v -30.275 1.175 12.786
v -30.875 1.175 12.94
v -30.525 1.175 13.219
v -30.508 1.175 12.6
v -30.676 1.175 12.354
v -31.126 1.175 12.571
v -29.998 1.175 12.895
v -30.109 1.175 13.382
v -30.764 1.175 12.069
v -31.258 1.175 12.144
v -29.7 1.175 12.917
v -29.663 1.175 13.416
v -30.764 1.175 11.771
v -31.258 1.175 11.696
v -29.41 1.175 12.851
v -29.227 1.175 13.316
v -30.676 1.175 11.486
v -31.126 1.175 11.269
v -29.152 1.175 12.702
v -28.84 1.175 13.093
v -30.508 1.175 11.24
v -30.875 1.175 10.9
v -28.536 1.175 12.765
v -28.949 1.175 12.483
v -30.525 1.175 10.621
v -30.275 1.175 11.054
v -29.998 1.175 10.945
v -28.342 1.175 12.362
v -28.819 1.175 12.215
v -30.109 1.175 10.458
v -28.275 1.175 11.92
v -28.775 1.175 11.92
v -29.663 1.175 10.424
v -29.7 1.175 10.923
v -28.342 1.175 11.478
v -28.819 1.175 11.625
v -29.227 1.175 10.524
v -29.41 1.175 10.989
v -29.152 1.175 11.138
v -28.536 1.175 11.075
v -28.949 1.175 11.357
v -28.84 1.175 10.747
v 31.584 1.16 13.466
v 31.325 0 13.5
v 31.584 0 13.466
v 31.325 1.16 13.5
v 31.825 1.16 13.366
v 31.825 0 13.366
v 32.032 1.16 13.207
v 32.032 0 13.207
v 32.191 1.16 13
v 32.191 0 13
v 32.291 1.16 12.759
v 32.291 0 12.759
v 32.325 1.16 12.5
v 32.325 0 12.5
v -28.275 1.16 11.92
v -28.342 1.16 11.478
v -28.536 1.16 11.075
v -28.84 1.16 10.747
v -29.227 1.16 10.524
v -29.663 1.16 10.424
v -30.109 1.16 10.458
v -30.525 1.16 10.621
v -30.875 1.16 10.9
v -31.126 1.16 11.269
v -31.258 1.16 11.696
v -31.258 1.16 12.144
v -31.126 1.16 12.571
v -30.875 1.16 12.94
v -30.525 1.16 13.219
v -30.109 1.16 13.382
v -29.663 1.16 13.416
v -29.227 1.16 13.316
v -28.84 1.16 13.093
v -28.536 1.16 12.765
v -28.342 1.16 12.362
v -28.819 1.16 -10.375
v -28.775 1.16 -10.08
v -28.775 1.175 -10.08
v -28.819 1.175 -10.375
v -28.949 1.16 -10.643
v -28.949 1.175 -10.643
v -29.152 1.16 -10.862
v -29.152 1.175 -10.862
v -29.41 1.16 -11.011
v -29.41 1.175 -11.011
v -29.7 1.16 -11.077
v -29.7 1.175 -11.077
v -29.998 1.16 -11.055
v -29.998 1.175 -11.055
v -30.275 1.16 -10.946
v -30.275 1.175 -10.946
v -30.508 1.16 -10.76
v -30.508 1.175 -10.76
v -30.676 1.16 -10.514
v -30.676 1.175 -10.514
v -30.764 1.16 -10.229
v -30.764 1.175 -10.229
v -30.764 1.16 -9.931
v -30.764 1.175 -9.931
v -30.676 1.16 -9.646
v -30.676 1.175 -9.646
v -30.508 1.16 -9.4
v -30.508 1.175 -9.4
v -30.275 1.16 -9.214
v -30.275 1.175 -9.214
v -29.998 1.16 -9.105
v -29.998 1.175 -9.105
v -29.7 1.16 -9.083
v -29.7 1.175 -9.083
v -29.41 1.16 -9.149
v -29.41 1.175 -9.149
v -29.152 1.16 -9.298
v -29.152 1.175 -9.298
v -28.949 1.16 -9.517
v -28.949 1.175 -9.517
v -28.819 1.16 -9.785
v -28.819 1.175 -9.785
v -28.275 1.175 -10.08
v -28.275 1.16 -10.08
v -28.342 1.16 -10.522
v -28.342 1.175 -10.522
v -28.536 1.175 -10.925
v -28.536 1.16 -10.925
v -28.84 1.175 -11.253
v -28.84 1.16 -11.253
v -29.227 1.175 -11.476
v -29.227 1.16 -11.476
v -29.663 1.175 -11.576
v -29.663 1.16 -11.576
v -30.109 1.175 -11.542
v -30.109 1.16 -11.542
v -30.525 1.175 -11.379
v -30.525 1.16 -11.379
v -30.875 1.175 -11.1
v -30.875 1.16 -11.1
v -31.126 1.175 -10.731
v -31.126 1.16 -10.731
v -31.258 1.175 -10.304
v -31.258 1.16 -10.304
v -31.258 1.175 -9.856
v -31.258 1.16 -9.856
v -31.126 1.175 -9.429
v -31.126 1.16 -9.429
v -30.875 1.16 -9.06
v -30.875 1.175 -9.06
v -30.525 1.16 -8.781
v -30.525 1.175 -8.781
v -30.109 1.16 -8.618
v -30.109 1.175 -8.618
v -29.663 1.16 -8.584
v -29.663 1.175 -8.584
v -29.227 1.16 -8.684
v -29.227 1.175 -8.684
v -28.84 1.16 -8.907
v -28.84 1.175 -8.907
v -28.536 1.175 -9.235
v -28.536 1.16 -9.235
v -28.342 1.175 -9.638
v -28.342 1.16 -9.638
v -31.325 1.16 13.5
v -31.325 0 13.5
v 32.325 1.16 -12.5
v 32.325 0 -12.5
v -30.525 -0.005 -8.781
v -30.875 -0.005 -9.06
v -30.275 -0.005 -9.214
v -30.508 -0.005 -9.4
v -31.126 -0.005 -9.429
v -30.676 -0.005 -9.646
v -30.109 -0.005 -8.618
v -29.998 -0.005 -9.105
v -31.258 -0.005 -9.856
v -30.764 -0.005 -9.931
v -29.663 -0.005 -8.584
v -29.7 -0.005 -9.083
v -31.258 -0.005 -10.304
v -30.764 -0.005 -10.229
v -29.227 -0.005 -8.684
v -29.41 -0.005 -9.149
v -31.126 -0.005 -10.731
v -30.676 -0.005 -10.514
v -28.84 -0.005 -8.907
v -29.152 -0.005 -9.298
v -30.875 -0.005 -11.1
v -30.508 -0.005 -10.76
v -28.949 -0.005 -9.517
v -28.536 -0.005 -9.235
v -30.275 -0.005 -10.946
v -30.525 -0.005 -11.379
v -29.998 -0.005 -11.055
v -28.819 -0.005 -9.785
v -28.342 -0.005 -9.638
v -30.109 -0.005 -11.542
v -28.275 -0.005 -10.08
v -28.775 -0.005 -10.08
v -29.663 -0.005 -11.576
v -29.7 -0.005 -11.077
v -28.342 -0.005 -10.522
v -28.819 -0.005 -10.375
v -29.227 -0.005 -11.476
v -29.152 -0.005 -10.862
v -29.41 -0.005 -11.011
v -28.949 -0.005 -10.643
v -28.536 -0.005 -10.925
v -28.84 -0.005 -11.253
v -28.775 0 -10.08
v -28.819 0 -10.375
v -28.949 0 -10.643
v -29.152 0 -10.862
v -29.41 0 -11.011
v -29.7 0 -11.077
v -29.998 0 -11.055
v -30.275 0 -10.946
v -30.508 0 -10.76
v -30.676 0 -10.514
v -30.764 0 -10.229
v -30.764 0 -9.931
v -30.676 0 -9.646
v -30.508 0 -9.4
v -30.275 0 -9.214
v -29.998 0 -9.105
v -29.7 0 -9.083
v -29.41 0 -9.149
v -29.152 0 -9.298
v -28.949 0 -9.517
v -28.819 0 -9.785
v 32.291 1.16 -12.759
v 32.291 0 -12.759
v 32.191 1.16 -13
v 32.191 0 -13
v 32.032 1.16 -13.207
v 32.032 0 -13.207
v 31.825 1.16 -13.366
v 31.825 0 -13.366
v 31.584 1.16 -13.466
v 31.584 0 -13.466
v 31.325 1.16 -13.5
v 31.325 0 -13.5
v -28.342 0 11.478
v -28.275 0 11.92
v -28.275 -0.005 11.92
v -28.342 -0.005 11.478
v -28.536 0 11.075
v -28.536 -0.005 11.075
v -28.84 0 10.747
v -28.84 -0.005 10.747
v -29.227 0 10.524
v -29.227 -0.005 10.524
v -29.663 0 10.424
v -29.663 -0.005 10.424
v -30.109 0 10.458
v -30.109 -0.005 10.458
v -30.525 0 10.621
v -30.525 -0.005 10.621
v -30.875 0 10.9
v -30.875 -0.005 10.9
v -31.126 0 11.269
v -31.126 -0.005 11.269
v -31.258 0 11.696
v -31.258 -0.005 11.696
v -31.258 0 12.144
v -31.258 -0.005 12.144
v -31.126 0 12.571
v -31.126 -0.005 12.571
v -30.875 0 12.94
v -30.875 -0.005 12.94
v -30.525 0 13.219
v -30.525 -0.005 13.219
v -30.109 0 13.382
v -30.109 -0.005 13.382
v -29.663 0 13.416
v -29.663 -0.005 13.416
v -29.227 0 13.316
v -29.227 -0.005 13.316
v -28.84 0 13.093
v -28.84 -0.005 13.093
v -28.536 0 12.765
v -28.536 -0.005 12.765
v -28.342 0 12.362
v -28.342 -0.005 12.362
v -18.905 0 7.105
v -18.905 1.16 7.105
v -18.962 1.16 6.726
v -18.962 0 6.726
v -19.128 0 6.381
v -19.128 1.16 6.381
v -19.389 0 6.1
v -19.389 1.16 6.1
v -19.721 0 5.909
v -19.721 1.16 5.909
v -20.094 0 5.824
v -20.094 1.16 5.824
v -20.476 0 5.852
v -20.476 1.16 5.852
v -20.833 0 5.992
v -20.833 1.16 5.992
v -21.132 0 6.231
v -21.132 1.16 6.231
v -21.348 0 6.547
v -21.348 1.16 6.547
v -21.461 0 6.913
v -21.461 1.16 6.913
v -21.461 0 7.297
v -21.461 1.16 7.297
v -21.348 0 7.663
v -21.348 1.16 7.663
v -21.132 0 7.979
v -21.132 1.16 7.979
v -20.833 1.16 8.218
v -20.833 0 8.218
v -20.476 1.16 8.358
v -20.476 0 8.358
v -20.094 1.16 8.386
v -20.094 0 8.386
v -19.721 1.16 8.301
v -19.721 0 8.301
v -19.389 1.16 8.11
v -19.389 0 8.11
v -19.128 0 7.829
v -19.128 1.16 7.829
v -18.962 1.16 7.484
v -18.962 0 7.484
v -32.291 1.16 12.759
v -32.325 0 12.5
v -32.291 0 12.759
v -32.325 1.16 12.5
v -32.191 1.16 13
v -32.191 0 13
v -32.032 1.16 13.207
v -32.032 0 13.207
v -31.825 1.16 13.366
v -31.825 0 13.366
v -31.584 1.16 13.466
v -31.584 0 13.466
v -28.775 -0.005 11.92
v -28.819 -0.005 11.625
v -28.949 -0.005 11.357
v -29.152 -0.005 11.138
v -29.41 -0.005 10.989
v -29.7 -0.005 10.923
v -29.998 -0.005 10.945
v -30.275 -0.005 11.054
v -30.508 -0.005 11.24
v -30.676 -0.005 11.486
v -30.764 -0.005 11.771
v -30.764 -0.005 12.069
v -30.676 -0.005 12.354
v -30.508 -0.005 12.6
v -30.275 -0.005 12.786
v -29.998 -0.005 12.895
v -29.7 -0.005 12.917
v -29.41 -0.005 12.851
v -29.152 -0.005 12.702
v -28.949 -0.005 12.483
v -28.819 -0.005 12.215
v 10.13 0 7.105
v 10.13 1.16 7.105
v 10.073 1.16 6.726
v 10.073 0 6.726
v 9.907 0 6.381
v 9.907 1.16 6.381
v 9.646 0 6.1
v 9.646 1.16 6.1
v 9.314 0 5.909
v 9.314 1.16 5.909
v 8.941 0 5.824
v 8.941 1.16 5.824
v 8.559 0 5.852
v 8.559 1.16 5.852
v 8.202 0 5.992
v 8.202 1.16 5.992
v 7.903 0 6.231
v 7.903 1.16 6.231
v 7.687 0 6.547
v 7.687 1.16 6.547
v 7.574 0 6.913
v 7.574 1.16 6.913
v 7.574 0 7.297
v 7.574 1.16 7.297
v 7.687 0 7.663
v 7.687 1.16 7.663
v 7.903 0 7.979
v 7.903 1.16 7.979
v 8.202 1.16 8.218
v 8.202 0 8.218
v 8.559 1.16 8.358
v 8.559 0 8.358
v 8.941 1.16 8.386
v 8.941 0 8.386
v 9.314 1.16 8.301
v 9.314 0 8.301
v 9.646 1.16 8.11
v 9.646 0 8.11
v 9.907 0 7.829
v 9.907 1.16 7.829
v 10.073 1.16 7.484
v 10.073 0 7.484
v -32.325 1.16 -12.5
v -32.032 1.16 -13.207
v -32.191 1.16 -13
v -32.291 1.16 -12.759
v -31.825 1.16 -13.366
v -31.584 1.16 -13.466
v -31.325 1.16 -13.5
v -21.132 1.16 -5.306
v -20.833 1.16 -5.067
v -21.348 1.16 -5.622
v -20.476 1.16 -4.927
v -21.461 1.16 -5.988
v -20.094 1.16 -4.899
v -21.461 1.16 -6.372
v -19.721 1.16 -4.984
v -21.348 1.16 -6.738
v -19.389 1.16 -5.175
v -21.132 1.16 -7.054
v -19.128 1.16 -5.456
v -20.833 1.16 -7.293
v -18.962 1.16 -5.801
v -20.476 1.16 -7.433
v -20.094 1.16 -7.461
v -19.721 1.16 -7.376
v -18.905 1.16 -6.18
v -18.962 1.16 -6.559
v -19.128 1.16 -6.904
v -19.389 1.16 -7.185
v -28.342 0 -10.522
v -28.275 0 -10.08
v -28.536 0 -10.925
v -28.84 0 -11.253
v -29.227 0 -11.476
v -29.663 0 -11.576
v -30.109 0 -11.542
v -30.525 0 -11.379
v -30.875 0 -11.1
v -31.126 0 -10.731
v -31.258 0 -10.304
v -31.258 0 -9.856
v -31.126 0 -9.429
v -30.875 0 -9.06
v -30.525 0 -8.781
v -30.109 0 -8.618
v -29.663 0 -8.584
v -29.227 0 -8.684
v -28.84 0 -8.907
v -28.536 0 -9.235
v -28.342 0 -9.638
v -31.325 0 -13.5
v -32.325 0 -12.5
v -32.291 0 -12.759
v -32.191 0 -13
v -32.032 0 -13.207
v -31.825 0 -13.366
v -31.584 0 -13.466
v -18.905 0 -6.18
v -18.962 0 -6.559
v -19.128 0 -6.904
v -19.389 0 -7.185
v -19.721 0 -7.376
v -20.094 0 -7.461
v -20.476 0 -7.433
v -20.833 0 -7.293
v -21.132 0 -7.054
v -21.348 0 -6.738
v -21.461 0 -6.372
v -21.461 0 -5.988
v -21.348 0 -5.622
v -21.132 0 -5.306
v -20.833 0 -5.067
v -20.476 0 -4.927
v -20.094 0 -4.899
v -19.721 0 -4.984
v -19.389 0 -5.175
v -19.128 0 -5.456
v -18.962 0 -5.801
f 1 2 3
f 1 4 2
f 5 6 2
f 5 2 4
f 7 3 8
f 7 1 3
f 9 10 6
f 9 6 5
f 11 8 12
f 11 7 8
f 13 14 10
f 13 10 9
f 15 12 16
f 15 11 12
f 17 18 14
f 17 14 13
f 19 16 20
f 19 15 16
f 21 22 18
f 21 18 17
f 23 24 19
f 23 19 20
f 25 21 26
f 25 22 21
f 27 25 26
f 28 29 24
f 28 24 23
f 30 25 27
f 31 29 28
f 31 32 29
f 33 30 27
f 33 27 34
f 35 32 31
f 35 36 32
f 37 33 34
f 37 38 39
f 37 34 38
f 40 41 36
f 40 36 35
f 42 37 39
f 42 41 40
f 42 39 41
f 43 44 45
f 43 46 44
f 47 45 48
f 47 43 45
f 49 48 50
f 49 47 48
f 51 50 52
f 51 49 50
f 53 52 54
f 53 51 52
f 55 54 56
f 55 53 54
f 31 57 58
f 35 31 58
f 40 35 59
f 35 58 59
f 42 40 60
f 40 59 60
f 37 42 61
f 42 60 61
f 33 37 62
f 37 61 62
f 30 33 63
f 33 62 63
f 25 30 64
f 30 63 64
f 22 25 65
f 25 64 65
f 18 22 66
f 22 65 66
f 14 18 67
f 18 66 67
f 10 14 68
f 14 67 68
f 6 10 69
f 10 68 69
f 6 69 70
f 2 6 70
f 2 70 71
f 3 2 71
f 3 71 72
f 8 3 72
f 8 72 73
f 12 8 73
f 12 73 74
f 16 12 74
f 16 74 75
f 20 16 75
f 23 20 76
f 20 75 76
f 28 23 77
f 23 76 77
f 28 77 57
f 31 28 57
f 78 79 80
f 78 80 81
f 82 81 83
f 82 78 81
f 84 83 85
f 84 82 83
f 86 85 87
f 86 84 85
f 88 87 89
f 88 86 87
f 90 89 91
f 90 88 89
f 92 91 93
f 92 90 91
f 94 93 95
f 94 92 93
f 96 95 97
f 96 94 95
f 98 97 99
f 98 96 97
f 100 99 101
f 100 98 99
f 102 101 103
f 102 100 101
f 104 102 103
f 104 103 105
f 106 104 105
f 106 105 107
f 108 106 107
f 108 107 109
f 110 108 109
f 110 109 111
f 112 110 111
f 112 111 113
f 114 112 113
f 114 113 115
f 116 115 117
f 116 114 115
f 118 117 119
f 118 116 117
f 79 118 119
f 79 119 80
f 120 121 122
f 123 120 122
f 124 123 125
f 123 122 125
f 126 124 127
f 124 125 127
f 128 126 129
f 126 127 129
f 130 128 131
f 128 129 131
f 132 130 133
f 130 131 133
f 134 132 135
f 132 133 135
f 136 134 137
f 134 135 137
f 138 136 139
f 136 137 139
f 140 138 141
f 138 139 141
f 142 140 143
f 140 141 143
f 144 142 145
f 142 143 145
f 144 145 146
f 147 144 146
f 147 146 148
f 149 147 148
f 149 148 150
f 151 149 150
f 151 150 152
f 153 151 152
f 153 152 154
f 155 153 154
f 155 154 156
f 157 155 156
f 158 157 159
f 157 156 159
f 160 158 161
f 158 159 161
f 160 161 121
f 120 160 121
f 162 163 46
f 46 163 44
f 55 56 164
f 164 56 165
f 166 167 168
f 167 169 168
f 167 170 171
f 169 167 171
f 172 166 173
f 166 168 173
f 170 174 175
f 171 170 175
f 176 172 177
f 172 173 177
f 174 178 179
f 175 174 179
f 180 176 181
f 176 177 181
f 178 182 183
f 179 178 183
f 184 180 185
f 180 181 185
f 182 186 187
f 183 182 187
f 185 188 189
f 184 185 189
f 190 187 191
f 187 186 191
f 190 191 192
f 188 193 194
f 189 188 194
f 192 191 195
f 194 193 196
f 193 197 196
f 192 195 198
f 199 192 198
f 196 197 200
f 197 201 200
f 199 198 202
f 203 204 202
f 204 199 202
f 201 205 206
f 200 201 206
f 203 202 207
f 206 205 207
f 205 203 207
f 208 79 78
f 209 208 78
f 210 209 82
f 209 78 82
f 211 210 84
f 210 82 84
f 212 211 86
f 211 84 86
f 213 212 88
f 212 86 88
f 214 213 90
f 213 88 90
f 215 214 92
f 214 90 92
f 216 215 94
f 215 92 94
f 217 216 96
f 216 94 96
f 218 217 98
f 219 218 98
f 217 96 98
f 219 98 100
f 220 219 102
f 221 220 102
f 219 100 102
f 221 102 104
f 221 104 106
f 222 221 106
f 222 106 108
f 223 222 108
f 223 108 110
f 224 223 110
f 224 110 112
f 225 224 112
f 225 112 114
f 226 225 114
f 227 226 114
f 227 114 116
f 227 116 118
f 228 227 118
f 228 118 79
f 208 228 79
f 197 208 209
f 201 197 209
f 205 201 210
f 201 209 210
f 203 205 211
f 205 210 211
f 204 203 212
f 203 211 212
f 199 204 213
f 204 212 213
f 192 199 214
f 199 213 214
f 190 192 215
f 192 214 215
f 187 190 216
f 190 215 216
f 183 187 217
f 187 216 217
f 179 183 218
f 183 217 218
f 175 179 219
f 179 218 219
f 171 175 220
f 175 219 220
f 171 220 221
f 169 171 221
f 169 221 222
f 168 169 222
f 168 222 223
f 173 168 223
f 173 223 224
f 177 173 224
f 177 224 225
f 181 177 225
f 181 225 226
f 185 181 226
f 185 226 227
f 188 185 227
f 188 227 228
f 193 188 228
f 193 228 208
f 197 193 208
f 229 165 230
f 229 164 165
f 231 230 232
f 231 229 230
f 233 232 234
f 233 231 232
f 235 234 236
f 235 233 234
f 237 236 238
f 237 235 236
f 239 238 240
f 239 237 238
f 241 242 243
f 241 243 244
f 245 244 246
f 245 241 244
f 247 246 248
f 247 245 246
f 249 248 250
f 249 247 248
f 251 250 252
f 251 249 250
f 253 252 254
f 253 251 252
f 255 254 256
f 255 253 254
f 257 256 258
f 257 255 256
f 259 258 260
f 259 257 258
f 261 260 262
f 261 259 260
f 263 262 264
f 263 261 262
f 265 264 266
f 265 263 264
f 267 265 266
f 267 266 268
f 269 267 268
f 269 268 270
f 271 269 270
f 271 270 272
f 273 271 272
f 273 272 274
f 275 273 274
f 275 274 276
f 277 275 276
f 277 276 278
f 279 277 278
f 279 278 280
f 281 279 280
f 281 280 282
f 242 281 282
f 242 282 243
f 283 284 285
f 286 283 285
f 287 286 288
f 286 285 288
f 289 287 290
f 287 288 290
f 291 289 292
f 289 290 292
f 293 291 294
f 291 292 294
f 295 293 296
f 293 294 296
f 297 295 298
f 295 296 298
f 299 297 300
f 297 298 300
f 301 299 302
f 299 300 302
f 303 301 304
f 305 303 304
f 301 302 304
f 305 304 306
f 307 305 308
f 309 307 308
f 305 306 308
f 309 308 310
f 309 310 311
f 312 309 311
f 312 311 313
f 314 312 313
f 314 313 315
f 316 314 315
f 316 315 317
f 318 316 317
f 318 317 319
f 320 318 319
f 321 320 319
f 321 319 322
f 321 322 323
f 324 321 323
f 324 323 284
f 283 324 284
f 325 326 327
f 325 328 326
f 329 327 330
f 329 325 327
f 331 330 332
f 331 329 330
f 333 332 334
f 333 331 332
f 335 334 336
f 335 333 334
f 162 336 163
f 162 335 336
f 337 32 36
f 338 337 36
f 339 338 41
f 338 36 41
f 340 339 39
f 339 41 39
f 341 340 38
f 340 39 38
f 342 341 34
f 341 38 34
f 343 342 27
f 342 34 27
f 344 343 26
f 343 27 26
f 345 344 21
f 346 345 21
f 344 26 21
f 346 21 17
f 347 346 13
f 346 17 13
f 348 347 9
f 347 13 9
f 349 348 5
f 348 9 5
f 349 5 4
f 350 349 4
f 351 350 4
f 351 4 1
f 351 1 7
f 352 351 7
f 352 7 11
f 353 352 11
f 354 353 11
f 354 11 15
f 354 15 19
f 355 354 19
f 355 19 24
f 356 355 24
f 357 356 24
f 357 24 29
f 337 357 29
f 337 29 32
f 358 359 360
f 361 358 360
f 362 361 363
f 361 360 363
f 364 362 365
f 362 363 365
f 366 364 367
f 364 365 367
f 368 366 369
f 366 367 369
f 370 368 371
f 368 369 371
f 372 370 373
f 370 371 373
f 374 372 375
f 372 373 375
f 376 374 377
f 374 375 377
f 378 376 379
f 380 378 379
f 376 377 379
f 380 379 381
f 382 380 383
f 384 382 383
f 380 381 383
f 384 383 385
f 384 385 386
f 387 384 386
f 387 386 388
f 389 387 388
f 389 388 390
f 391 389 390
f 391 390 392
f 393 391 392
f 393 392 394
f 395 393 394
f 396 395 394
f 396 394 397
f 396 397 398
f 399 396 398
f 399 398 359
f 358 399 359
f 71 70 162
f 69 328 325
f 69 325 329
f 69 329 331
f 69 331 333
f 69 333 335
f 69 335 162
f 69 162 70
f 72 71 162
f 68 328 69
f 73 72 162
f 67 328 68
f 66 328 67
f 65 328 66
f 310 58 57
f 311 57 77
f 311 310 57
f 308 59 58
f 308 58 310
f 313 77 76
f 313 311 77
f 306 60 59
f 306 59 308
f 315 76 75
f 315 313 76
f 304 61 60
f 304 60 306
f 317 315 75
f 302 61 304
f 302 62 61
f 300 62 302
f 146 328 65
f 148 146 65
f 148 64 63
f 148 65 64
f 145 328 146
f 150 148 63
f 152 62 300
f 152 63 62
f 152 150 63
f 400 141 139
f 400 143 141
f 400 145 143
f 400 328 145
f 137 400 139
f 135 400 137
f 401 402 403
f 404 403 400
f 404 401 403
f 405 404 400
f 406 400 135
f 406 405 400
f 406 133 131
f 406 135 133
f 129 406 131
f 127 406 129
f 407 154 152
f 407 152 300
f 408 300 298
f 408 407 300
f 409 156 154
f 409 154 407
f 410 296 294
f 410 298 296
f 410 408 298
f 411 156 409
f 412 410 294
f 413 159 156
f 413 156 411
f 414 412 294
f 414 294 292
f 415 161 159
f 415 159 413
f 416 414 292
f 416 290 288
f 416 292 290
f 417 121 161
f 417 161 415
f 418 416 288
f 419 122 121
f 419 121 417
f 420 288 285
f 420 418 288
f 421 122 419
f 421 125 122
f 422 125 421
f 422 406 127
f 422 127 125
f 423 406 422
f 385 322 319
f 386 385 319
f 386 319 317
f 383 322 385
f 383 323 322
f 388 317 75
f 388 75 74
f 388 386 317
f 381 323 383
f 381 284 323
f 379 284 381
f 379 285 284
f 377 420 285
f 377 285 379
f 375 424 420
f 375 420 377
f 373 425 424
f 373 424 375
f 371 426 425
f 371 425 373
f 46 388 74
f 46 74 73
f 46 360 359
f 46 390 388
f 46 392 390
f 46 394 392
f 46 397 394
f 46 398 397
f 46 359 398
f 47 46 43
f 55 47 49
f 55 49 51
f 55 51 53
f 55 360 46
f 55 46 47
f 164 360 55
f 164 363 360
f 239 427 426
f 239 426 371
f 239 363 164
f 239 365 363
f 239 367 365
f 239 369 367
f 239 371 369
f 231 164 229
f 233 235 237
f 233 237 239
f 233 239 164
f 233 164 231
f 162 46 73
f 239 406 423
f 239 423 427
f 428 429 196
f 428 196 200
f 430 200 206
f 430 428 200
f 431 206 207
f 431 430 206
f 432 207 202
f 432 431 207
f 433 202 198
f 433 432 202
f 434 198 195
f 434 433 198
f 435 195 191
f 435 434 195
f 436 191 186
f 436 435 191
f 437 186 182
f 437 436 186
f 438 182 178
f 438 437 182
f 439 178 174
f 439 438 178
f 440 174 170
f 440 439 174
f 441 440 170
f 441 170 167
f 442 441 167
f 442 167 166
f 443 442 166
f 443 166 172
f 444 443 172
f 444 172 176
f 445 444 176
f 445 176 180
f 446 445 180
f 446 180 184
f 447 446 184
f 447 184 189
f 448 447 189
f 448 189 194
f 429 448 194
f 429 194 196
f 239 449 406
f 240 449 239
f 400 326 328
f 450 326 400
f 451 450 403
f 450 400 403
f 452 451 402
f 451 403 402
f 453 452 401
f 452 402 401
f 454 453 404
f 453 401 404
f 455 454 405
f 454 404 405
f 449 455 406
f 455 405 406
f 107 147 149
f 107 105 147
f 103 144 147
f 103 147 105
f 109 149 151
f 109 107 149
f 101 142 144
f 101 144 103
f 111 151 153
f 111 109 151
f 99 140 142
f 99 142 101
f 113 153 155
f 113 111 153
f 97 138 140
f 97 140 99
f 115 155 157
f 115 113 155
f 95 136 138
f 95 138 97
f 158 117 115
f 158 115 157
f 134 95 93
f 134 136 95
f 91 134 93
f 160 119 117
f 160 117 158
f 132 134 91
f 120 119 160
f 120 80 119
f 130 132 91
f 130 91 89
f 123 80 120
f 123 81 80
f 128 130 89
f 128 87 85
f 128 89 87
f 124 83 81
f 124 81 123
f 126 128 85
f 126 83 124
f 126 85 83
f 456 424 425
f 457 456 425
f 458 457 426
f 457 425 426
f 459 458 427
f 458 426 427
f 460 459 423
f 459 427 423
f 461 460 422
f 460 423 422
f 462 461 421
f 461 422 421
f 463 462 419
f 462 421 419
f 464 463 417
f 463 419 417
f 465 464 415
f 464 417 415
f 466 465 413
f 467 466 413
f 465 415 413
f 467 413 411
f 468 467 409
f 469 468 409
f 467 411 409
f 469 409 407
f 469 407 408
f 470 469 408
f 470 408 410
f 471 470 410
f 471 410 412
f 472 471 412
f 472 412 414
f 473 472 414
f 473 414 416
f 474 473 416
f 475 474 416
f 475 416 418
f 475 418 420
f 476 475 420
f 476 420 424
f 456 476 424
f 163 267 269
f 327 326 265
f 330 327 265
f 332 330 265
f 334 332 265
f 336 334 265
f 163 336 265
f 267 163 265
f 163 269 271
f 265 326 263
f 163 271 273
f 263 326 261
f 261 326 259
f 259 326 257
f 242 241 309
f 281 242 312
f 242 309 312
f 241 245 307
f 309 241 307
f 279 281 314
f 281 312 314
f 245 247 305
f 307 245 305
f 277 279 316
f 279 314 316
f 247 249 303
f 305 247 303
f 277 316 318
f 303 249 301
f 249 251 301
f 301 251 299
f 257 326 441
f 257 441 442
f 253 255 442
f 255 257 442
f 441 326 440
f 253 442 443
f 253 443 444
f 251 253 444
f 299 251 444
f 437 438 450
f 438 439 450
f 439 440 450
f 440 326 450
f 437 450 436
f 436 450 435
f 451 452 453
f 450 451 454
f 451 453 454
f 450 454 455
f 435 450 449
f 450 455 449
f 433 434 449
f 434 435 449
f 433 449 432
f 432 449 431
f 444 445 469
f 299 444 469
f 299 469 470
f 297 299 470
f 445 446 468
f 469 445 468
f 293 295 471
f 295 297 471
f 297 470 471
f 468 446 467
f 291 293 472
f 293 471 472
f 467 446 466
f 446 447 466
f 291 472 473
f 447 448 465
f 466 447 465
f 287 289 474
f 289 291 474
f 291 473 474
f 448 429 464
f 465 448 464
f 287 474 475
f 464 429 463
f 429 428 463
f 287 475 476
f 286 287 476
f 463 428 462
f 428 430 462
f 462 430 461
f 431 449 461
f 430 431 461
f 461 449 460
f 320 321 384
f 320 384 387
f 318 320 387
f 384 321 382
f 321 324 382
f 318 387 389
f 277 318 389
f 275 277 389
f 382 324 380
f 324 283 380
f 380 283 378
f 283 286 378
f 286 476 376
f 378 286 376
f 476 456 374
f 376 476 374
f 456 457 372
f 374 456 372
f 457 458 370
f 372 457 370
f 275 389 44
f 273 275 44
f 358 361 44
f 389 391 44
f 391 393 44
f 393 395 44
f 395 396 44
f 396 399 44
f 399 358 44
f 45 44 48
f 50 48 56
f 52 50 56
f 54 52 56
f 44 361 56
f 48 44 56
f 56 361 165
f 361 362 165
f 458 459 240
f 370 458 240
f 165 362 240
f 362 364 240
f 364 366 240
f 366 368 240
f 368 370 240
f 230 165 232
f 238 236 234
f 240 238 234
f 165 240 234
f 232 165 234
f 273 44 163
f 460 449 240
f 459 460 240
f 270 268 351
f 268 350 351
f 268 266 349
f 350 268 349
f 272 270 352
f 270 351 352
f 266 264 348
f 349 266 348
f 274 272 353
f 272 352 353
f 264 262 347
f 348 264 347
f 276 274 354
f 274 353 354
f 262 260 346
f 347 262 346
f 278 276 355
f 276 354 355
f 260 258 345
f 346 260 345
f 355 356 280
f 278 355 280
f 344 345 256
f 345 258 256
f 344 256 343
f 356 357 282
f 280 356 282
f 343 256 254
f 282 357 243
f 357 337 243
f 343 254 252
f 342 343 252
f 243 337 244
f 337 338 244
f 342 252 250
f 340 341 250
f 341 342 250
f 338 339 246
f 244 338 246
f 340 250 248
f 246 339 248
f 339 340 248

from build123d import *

# Parameters (mm, degrees)
SKETCH1_W                = 64.65
SKETCH1_H                = 27
BOSS_EXTRUDE1_DEPTH      = 1.16
FILLET1_R                = 1
SKETCH2_R                = 1
SKETCH2_R_2              = 1.285
CUT_EXTRUDE1_DEPTH       = 2.16
SKETCH3_R                = 1.5
SKETCH3_R_2              = 1
BOSS_EXTRUDE2_DEPTH      = 0.015
BOSS_EXTRUDE2_DEPTH_BACK = 1.165


with BuildPart() as part:
    # Sketch1 → Boss-Extrude1 (new body)
    with BuildSketch(Plane(origin=(0, 0, 0), x_dir=(1, 0, 0), z_dir=(0, 1, 0))):
        Rectangle(SKETCH1_W, SKETCH1_H)
    extrude(amount=BOSS_EXTRUDE1_DEPTH)

    # Fillet1
    fillet1_edges = [part.edges().sort_by_distance(p)[0] for p in [
        (32.325, 0.58, 13.5),
        (-32.325, 0.58, 13.5),
        (-32.325, 0.58, -13.5),
        (32.325, 0.58, -13.5),
    ]]
    fillet(fillet1_edges, radius=FILLET1_R)

    # Sketch2 → Cut-Extrude1 (cut, through all)
    with BuildSketch(Plane(origin=(0, 1.16, 0), x_dir=(1, 0, 0), z_dir=(0, 1, 0))):
        with Locations((-29.775, -11.92)):
            Circle(SKETCH2_R)
        with Locations((-29.775, 10.08)):
            Circle(SKETCH2_R)
        with Locations((-20.19, -7.105)):
            Circle(SKETCH2_R_2)
        with Locations((-20.19, 6.18)):
            Circle(SKETCH2_R_2)
        with Locations((8.845, -7.105)):
            Circle(SKETCH2_R_2)
    extrude(amount=-CUT_EXTRUDE1_DEPTH, mode=Mode.SUBTRACT)

    # Sketch3 → Boss-Extrude2 (add, two sides)
    with BuildSketch(Plane(origin=(0, 1.16, 0), x_dir=(1, 0, 0), z_dir=(0, 1, 0))) as boss_extrude2_sk:
        with Locations((-29.775, -11.92)):
            Circle(SKETCH3_R)
        with Locations((-29.775, -11.92)):
            Circle(SKETCH3_R_2, mode=Mode.SUBTRACT)
        with Locations((-29.775, 10.08)):
            Circle(SKETCH3_R)
        with Locations((-29.775, 10.08)):
            Circle(SKETCH3_R_2, mode=Mode.SUBTRACT)
    extrude(amount=BOSS_EXTRUDE2_DEPTH)
    extrude(boss_extrude2_sk.sketch, amount=-BOSS_EXTRUDE2_DEPTH_BACK)


solid = part.part
